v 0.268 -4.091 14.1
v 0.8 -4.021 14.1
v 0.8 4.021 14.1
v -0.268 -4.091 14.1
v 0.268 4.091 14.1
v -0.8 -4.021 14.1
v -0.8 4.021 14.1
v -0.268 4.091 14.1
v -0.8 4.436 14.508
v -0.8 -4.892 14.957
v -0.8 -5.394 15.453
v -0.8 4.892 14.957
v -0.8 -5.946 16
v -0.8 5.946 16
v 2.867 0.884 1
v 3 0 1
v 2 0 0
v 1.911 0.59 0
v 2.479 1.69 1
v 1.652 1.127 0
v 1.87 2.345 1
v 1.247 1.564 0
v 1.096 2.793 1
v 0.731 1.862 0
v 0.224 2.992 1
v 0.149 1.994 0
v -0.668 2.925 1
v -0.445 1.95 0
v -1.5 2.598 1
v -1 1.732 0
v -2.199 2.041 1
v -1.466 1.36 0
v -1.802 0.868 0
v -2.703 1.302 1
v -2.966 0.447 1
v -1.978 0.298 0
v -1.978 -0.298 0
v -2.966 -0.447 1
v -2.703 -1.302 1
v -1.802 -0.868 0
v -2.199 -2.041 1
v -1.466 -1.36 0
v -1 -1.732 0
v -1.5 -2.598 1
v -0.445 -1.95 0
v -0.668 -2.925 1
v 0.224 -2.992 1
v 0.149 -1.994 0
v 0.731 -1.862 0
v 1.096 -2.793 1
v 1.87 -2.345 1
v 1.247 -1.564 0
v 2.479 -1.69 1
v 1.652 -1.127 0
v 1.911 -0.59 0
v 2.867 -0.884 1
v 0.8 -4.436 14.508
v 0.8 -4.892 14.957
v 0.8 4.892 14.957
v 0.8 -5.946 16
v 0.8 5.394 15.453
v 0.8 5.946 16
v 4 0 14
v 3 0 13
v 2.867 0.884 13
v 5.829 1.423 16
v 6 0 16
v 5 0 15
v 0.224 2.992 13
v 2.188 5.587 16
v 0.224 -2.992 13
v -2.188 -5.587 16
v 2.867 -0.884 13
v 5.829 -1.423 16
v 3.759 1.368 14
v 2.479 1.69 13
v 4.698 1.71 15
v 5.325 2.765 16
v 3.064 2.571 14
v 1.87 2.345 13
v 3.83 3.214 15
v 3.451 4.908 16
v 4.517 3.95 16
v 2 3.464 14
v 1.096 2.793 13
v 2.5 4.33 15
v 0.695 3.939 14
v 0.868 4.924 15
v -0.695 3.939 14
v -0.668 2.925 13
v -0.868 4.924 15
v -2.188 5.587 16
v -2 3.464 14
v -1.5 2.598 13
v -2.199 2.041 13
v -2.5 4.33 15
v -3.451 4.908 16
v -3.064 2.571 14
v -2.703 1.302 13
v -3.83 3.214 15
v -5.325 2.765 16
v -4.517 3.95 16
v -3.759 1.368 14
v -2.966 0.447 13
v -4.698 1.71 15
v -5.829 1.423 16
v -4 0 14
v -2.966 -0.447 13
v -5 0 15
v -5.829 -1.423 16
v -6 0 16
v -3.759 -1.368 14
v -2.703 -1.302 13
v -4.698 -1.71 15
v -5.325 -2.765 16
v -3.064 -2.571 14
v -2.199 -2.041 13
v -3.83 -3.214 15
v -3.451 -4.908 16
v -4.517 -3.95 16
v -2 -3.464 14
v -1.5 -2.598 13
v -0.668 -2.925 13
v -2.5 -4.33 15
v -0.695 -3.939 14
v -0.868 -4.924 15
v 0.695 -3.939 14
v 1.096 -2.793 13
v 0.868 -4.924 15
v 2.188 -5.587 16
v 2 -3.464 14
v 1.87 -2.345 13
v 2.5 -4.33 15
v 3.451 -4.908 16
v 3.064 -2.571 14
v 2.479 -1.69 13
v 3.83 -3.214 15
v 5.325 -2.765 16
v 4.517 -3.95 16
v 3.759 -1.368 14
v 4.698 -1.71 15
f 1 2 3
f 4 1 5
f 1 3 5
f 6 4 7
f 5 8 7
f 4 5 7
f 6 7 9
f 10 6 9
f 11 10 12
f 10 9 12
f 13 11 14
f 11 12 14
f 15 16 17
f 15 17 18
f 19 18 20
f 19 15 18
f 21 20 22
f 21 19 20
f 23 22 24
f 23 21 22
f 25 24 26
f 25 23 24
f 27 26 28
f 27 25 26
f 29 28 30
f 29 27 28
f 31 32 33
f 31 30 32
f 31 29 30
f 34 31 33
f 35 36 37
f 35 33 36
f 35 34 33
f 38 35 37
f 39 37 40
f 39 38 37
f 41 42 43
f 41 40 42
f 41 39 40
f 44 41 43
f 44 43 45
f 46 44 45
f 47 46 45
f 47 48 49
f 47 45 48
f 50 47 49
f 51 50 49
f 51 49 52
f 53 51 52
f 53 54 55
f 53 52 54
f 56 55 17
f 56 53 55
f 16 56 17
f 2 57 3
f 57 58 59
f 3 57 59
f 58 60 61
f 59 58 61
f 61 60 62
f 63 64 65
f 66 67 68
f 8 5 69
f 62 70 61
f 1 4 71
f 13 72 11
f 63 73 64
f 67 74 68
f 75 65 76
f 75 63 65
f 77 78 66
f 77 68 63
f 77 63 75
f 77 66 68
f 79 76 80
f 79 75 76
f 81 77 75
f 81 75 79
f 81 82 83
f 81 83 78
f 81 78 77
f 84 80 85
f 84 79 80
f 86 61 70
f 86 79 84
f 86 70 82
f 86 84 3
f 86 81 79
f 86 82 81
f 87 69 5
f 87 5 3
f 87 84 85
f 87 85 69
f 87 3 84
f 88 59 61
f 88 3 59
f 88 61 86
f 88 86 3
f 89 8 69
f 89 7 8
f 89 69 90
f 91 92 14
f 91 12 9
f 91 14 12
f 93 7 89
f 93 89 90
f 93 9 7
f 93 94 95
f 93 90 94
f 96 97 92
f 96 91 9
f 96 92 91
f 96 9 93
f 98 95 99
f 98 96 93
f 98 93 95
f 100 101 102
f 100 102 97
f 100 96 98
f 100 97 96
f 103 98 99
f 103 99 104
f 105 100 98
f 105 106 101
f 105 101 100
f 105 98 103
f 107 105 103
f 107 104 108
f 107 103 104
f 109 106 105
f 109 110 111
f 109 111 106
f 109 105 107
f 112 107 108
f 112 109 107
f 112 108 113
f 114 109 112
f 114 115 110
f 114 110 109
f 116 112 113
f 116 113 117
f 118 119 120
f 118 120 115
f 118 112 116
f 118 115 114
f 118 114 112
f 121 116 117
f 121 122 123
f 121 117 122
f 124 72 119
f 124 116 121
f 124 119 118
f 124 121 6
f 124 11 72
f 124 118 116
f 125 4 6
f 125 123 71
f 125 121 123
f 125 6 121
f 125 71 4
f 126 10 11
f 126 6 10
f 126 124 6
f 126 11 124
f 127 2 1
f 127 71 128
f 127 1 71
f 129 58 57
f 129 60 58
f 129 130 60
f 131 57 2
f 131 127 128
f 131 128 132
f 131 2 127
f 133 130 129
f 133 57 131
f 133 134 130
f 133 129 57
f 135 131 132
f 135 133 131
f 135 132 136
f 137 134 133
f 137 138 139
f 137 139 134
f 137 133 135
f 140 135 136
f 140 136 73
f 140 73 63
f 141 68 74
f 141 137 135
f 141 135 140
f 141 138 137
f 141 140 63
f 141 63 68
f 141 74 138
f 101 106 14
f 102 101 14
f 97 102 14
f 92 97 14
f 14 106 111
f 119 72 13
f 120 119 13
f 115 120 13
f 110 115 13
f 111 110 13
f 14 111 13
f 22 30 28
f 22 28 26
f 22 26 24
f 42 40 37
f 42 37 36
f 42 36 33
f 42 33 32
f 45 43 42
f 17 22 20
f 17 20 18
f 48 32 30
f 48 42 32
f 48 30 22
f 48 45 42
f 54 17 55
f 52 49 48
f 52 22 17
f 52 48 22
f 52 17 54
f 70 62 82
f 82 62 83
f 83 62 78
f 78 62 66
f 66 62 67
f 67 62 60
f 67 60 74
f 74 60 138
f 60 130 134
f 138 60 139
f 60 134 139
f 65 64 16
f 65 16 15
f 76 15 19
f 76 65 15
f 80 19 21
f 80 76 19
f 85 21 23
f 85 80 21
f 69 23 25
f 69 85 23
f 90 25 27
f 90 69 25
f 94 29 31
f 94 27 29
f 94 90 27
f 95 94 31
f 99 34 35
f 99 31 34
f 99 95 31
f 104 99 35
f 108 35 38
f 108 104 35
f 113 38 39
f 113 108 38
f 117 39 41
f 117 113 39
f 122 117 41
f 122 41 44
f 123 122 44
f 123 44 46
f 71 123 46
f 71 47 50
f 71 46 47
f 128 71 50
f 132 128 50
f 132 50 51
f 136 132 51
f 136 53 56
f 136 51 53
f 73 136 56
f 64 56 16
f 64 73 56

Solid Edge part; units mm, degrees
sketch "Sketch1" plane through (0, 0, 0) normal (0, -1, 0) x (1, 0, 0)
  line L0 (0, 0) -> (3, 0)
  line L1 (3, 0) -> (3, 13)
  line L2 (3, 13) -> (6, 16)
  line L3 (6, 16) -> (0, 16)
  line L4 (0, 16) -> (0, 0)
  dimension "D1" = 13
  dimension "D2" = 16
revolve "RevolvedProtrusion1" add sketch "Sketch1" angle 360 about axis through (0, 0, 54) along (0, 0, -1)
cosmetic_thread "Thread1" size "M6"
sketch "Sketch2" plane through (0, 0, 0) normal (0, -1, 0) x (1, 0, 0)
  line L0 (-0.8, 16) -> (0.8, 16)
  line L1 (0.8, 16) -> (0.8, 14.1)
  line L2 (0.8, 14.1) -> (-0.8, 14.1)
  line L3 (-0.8, 14.1) -> (-0.8, 16)
  dimension "D1" = 1.6
  dimension "D2" = 1.9
extrude "Cutout1" cut sketch "Sketch2" along normal mid plane 73.4291
chamfer "Chamfer_1" distance 1 angle 45 1 edges at (-3, 0, 0)
properties part number "4" material "Fe 410 W"
